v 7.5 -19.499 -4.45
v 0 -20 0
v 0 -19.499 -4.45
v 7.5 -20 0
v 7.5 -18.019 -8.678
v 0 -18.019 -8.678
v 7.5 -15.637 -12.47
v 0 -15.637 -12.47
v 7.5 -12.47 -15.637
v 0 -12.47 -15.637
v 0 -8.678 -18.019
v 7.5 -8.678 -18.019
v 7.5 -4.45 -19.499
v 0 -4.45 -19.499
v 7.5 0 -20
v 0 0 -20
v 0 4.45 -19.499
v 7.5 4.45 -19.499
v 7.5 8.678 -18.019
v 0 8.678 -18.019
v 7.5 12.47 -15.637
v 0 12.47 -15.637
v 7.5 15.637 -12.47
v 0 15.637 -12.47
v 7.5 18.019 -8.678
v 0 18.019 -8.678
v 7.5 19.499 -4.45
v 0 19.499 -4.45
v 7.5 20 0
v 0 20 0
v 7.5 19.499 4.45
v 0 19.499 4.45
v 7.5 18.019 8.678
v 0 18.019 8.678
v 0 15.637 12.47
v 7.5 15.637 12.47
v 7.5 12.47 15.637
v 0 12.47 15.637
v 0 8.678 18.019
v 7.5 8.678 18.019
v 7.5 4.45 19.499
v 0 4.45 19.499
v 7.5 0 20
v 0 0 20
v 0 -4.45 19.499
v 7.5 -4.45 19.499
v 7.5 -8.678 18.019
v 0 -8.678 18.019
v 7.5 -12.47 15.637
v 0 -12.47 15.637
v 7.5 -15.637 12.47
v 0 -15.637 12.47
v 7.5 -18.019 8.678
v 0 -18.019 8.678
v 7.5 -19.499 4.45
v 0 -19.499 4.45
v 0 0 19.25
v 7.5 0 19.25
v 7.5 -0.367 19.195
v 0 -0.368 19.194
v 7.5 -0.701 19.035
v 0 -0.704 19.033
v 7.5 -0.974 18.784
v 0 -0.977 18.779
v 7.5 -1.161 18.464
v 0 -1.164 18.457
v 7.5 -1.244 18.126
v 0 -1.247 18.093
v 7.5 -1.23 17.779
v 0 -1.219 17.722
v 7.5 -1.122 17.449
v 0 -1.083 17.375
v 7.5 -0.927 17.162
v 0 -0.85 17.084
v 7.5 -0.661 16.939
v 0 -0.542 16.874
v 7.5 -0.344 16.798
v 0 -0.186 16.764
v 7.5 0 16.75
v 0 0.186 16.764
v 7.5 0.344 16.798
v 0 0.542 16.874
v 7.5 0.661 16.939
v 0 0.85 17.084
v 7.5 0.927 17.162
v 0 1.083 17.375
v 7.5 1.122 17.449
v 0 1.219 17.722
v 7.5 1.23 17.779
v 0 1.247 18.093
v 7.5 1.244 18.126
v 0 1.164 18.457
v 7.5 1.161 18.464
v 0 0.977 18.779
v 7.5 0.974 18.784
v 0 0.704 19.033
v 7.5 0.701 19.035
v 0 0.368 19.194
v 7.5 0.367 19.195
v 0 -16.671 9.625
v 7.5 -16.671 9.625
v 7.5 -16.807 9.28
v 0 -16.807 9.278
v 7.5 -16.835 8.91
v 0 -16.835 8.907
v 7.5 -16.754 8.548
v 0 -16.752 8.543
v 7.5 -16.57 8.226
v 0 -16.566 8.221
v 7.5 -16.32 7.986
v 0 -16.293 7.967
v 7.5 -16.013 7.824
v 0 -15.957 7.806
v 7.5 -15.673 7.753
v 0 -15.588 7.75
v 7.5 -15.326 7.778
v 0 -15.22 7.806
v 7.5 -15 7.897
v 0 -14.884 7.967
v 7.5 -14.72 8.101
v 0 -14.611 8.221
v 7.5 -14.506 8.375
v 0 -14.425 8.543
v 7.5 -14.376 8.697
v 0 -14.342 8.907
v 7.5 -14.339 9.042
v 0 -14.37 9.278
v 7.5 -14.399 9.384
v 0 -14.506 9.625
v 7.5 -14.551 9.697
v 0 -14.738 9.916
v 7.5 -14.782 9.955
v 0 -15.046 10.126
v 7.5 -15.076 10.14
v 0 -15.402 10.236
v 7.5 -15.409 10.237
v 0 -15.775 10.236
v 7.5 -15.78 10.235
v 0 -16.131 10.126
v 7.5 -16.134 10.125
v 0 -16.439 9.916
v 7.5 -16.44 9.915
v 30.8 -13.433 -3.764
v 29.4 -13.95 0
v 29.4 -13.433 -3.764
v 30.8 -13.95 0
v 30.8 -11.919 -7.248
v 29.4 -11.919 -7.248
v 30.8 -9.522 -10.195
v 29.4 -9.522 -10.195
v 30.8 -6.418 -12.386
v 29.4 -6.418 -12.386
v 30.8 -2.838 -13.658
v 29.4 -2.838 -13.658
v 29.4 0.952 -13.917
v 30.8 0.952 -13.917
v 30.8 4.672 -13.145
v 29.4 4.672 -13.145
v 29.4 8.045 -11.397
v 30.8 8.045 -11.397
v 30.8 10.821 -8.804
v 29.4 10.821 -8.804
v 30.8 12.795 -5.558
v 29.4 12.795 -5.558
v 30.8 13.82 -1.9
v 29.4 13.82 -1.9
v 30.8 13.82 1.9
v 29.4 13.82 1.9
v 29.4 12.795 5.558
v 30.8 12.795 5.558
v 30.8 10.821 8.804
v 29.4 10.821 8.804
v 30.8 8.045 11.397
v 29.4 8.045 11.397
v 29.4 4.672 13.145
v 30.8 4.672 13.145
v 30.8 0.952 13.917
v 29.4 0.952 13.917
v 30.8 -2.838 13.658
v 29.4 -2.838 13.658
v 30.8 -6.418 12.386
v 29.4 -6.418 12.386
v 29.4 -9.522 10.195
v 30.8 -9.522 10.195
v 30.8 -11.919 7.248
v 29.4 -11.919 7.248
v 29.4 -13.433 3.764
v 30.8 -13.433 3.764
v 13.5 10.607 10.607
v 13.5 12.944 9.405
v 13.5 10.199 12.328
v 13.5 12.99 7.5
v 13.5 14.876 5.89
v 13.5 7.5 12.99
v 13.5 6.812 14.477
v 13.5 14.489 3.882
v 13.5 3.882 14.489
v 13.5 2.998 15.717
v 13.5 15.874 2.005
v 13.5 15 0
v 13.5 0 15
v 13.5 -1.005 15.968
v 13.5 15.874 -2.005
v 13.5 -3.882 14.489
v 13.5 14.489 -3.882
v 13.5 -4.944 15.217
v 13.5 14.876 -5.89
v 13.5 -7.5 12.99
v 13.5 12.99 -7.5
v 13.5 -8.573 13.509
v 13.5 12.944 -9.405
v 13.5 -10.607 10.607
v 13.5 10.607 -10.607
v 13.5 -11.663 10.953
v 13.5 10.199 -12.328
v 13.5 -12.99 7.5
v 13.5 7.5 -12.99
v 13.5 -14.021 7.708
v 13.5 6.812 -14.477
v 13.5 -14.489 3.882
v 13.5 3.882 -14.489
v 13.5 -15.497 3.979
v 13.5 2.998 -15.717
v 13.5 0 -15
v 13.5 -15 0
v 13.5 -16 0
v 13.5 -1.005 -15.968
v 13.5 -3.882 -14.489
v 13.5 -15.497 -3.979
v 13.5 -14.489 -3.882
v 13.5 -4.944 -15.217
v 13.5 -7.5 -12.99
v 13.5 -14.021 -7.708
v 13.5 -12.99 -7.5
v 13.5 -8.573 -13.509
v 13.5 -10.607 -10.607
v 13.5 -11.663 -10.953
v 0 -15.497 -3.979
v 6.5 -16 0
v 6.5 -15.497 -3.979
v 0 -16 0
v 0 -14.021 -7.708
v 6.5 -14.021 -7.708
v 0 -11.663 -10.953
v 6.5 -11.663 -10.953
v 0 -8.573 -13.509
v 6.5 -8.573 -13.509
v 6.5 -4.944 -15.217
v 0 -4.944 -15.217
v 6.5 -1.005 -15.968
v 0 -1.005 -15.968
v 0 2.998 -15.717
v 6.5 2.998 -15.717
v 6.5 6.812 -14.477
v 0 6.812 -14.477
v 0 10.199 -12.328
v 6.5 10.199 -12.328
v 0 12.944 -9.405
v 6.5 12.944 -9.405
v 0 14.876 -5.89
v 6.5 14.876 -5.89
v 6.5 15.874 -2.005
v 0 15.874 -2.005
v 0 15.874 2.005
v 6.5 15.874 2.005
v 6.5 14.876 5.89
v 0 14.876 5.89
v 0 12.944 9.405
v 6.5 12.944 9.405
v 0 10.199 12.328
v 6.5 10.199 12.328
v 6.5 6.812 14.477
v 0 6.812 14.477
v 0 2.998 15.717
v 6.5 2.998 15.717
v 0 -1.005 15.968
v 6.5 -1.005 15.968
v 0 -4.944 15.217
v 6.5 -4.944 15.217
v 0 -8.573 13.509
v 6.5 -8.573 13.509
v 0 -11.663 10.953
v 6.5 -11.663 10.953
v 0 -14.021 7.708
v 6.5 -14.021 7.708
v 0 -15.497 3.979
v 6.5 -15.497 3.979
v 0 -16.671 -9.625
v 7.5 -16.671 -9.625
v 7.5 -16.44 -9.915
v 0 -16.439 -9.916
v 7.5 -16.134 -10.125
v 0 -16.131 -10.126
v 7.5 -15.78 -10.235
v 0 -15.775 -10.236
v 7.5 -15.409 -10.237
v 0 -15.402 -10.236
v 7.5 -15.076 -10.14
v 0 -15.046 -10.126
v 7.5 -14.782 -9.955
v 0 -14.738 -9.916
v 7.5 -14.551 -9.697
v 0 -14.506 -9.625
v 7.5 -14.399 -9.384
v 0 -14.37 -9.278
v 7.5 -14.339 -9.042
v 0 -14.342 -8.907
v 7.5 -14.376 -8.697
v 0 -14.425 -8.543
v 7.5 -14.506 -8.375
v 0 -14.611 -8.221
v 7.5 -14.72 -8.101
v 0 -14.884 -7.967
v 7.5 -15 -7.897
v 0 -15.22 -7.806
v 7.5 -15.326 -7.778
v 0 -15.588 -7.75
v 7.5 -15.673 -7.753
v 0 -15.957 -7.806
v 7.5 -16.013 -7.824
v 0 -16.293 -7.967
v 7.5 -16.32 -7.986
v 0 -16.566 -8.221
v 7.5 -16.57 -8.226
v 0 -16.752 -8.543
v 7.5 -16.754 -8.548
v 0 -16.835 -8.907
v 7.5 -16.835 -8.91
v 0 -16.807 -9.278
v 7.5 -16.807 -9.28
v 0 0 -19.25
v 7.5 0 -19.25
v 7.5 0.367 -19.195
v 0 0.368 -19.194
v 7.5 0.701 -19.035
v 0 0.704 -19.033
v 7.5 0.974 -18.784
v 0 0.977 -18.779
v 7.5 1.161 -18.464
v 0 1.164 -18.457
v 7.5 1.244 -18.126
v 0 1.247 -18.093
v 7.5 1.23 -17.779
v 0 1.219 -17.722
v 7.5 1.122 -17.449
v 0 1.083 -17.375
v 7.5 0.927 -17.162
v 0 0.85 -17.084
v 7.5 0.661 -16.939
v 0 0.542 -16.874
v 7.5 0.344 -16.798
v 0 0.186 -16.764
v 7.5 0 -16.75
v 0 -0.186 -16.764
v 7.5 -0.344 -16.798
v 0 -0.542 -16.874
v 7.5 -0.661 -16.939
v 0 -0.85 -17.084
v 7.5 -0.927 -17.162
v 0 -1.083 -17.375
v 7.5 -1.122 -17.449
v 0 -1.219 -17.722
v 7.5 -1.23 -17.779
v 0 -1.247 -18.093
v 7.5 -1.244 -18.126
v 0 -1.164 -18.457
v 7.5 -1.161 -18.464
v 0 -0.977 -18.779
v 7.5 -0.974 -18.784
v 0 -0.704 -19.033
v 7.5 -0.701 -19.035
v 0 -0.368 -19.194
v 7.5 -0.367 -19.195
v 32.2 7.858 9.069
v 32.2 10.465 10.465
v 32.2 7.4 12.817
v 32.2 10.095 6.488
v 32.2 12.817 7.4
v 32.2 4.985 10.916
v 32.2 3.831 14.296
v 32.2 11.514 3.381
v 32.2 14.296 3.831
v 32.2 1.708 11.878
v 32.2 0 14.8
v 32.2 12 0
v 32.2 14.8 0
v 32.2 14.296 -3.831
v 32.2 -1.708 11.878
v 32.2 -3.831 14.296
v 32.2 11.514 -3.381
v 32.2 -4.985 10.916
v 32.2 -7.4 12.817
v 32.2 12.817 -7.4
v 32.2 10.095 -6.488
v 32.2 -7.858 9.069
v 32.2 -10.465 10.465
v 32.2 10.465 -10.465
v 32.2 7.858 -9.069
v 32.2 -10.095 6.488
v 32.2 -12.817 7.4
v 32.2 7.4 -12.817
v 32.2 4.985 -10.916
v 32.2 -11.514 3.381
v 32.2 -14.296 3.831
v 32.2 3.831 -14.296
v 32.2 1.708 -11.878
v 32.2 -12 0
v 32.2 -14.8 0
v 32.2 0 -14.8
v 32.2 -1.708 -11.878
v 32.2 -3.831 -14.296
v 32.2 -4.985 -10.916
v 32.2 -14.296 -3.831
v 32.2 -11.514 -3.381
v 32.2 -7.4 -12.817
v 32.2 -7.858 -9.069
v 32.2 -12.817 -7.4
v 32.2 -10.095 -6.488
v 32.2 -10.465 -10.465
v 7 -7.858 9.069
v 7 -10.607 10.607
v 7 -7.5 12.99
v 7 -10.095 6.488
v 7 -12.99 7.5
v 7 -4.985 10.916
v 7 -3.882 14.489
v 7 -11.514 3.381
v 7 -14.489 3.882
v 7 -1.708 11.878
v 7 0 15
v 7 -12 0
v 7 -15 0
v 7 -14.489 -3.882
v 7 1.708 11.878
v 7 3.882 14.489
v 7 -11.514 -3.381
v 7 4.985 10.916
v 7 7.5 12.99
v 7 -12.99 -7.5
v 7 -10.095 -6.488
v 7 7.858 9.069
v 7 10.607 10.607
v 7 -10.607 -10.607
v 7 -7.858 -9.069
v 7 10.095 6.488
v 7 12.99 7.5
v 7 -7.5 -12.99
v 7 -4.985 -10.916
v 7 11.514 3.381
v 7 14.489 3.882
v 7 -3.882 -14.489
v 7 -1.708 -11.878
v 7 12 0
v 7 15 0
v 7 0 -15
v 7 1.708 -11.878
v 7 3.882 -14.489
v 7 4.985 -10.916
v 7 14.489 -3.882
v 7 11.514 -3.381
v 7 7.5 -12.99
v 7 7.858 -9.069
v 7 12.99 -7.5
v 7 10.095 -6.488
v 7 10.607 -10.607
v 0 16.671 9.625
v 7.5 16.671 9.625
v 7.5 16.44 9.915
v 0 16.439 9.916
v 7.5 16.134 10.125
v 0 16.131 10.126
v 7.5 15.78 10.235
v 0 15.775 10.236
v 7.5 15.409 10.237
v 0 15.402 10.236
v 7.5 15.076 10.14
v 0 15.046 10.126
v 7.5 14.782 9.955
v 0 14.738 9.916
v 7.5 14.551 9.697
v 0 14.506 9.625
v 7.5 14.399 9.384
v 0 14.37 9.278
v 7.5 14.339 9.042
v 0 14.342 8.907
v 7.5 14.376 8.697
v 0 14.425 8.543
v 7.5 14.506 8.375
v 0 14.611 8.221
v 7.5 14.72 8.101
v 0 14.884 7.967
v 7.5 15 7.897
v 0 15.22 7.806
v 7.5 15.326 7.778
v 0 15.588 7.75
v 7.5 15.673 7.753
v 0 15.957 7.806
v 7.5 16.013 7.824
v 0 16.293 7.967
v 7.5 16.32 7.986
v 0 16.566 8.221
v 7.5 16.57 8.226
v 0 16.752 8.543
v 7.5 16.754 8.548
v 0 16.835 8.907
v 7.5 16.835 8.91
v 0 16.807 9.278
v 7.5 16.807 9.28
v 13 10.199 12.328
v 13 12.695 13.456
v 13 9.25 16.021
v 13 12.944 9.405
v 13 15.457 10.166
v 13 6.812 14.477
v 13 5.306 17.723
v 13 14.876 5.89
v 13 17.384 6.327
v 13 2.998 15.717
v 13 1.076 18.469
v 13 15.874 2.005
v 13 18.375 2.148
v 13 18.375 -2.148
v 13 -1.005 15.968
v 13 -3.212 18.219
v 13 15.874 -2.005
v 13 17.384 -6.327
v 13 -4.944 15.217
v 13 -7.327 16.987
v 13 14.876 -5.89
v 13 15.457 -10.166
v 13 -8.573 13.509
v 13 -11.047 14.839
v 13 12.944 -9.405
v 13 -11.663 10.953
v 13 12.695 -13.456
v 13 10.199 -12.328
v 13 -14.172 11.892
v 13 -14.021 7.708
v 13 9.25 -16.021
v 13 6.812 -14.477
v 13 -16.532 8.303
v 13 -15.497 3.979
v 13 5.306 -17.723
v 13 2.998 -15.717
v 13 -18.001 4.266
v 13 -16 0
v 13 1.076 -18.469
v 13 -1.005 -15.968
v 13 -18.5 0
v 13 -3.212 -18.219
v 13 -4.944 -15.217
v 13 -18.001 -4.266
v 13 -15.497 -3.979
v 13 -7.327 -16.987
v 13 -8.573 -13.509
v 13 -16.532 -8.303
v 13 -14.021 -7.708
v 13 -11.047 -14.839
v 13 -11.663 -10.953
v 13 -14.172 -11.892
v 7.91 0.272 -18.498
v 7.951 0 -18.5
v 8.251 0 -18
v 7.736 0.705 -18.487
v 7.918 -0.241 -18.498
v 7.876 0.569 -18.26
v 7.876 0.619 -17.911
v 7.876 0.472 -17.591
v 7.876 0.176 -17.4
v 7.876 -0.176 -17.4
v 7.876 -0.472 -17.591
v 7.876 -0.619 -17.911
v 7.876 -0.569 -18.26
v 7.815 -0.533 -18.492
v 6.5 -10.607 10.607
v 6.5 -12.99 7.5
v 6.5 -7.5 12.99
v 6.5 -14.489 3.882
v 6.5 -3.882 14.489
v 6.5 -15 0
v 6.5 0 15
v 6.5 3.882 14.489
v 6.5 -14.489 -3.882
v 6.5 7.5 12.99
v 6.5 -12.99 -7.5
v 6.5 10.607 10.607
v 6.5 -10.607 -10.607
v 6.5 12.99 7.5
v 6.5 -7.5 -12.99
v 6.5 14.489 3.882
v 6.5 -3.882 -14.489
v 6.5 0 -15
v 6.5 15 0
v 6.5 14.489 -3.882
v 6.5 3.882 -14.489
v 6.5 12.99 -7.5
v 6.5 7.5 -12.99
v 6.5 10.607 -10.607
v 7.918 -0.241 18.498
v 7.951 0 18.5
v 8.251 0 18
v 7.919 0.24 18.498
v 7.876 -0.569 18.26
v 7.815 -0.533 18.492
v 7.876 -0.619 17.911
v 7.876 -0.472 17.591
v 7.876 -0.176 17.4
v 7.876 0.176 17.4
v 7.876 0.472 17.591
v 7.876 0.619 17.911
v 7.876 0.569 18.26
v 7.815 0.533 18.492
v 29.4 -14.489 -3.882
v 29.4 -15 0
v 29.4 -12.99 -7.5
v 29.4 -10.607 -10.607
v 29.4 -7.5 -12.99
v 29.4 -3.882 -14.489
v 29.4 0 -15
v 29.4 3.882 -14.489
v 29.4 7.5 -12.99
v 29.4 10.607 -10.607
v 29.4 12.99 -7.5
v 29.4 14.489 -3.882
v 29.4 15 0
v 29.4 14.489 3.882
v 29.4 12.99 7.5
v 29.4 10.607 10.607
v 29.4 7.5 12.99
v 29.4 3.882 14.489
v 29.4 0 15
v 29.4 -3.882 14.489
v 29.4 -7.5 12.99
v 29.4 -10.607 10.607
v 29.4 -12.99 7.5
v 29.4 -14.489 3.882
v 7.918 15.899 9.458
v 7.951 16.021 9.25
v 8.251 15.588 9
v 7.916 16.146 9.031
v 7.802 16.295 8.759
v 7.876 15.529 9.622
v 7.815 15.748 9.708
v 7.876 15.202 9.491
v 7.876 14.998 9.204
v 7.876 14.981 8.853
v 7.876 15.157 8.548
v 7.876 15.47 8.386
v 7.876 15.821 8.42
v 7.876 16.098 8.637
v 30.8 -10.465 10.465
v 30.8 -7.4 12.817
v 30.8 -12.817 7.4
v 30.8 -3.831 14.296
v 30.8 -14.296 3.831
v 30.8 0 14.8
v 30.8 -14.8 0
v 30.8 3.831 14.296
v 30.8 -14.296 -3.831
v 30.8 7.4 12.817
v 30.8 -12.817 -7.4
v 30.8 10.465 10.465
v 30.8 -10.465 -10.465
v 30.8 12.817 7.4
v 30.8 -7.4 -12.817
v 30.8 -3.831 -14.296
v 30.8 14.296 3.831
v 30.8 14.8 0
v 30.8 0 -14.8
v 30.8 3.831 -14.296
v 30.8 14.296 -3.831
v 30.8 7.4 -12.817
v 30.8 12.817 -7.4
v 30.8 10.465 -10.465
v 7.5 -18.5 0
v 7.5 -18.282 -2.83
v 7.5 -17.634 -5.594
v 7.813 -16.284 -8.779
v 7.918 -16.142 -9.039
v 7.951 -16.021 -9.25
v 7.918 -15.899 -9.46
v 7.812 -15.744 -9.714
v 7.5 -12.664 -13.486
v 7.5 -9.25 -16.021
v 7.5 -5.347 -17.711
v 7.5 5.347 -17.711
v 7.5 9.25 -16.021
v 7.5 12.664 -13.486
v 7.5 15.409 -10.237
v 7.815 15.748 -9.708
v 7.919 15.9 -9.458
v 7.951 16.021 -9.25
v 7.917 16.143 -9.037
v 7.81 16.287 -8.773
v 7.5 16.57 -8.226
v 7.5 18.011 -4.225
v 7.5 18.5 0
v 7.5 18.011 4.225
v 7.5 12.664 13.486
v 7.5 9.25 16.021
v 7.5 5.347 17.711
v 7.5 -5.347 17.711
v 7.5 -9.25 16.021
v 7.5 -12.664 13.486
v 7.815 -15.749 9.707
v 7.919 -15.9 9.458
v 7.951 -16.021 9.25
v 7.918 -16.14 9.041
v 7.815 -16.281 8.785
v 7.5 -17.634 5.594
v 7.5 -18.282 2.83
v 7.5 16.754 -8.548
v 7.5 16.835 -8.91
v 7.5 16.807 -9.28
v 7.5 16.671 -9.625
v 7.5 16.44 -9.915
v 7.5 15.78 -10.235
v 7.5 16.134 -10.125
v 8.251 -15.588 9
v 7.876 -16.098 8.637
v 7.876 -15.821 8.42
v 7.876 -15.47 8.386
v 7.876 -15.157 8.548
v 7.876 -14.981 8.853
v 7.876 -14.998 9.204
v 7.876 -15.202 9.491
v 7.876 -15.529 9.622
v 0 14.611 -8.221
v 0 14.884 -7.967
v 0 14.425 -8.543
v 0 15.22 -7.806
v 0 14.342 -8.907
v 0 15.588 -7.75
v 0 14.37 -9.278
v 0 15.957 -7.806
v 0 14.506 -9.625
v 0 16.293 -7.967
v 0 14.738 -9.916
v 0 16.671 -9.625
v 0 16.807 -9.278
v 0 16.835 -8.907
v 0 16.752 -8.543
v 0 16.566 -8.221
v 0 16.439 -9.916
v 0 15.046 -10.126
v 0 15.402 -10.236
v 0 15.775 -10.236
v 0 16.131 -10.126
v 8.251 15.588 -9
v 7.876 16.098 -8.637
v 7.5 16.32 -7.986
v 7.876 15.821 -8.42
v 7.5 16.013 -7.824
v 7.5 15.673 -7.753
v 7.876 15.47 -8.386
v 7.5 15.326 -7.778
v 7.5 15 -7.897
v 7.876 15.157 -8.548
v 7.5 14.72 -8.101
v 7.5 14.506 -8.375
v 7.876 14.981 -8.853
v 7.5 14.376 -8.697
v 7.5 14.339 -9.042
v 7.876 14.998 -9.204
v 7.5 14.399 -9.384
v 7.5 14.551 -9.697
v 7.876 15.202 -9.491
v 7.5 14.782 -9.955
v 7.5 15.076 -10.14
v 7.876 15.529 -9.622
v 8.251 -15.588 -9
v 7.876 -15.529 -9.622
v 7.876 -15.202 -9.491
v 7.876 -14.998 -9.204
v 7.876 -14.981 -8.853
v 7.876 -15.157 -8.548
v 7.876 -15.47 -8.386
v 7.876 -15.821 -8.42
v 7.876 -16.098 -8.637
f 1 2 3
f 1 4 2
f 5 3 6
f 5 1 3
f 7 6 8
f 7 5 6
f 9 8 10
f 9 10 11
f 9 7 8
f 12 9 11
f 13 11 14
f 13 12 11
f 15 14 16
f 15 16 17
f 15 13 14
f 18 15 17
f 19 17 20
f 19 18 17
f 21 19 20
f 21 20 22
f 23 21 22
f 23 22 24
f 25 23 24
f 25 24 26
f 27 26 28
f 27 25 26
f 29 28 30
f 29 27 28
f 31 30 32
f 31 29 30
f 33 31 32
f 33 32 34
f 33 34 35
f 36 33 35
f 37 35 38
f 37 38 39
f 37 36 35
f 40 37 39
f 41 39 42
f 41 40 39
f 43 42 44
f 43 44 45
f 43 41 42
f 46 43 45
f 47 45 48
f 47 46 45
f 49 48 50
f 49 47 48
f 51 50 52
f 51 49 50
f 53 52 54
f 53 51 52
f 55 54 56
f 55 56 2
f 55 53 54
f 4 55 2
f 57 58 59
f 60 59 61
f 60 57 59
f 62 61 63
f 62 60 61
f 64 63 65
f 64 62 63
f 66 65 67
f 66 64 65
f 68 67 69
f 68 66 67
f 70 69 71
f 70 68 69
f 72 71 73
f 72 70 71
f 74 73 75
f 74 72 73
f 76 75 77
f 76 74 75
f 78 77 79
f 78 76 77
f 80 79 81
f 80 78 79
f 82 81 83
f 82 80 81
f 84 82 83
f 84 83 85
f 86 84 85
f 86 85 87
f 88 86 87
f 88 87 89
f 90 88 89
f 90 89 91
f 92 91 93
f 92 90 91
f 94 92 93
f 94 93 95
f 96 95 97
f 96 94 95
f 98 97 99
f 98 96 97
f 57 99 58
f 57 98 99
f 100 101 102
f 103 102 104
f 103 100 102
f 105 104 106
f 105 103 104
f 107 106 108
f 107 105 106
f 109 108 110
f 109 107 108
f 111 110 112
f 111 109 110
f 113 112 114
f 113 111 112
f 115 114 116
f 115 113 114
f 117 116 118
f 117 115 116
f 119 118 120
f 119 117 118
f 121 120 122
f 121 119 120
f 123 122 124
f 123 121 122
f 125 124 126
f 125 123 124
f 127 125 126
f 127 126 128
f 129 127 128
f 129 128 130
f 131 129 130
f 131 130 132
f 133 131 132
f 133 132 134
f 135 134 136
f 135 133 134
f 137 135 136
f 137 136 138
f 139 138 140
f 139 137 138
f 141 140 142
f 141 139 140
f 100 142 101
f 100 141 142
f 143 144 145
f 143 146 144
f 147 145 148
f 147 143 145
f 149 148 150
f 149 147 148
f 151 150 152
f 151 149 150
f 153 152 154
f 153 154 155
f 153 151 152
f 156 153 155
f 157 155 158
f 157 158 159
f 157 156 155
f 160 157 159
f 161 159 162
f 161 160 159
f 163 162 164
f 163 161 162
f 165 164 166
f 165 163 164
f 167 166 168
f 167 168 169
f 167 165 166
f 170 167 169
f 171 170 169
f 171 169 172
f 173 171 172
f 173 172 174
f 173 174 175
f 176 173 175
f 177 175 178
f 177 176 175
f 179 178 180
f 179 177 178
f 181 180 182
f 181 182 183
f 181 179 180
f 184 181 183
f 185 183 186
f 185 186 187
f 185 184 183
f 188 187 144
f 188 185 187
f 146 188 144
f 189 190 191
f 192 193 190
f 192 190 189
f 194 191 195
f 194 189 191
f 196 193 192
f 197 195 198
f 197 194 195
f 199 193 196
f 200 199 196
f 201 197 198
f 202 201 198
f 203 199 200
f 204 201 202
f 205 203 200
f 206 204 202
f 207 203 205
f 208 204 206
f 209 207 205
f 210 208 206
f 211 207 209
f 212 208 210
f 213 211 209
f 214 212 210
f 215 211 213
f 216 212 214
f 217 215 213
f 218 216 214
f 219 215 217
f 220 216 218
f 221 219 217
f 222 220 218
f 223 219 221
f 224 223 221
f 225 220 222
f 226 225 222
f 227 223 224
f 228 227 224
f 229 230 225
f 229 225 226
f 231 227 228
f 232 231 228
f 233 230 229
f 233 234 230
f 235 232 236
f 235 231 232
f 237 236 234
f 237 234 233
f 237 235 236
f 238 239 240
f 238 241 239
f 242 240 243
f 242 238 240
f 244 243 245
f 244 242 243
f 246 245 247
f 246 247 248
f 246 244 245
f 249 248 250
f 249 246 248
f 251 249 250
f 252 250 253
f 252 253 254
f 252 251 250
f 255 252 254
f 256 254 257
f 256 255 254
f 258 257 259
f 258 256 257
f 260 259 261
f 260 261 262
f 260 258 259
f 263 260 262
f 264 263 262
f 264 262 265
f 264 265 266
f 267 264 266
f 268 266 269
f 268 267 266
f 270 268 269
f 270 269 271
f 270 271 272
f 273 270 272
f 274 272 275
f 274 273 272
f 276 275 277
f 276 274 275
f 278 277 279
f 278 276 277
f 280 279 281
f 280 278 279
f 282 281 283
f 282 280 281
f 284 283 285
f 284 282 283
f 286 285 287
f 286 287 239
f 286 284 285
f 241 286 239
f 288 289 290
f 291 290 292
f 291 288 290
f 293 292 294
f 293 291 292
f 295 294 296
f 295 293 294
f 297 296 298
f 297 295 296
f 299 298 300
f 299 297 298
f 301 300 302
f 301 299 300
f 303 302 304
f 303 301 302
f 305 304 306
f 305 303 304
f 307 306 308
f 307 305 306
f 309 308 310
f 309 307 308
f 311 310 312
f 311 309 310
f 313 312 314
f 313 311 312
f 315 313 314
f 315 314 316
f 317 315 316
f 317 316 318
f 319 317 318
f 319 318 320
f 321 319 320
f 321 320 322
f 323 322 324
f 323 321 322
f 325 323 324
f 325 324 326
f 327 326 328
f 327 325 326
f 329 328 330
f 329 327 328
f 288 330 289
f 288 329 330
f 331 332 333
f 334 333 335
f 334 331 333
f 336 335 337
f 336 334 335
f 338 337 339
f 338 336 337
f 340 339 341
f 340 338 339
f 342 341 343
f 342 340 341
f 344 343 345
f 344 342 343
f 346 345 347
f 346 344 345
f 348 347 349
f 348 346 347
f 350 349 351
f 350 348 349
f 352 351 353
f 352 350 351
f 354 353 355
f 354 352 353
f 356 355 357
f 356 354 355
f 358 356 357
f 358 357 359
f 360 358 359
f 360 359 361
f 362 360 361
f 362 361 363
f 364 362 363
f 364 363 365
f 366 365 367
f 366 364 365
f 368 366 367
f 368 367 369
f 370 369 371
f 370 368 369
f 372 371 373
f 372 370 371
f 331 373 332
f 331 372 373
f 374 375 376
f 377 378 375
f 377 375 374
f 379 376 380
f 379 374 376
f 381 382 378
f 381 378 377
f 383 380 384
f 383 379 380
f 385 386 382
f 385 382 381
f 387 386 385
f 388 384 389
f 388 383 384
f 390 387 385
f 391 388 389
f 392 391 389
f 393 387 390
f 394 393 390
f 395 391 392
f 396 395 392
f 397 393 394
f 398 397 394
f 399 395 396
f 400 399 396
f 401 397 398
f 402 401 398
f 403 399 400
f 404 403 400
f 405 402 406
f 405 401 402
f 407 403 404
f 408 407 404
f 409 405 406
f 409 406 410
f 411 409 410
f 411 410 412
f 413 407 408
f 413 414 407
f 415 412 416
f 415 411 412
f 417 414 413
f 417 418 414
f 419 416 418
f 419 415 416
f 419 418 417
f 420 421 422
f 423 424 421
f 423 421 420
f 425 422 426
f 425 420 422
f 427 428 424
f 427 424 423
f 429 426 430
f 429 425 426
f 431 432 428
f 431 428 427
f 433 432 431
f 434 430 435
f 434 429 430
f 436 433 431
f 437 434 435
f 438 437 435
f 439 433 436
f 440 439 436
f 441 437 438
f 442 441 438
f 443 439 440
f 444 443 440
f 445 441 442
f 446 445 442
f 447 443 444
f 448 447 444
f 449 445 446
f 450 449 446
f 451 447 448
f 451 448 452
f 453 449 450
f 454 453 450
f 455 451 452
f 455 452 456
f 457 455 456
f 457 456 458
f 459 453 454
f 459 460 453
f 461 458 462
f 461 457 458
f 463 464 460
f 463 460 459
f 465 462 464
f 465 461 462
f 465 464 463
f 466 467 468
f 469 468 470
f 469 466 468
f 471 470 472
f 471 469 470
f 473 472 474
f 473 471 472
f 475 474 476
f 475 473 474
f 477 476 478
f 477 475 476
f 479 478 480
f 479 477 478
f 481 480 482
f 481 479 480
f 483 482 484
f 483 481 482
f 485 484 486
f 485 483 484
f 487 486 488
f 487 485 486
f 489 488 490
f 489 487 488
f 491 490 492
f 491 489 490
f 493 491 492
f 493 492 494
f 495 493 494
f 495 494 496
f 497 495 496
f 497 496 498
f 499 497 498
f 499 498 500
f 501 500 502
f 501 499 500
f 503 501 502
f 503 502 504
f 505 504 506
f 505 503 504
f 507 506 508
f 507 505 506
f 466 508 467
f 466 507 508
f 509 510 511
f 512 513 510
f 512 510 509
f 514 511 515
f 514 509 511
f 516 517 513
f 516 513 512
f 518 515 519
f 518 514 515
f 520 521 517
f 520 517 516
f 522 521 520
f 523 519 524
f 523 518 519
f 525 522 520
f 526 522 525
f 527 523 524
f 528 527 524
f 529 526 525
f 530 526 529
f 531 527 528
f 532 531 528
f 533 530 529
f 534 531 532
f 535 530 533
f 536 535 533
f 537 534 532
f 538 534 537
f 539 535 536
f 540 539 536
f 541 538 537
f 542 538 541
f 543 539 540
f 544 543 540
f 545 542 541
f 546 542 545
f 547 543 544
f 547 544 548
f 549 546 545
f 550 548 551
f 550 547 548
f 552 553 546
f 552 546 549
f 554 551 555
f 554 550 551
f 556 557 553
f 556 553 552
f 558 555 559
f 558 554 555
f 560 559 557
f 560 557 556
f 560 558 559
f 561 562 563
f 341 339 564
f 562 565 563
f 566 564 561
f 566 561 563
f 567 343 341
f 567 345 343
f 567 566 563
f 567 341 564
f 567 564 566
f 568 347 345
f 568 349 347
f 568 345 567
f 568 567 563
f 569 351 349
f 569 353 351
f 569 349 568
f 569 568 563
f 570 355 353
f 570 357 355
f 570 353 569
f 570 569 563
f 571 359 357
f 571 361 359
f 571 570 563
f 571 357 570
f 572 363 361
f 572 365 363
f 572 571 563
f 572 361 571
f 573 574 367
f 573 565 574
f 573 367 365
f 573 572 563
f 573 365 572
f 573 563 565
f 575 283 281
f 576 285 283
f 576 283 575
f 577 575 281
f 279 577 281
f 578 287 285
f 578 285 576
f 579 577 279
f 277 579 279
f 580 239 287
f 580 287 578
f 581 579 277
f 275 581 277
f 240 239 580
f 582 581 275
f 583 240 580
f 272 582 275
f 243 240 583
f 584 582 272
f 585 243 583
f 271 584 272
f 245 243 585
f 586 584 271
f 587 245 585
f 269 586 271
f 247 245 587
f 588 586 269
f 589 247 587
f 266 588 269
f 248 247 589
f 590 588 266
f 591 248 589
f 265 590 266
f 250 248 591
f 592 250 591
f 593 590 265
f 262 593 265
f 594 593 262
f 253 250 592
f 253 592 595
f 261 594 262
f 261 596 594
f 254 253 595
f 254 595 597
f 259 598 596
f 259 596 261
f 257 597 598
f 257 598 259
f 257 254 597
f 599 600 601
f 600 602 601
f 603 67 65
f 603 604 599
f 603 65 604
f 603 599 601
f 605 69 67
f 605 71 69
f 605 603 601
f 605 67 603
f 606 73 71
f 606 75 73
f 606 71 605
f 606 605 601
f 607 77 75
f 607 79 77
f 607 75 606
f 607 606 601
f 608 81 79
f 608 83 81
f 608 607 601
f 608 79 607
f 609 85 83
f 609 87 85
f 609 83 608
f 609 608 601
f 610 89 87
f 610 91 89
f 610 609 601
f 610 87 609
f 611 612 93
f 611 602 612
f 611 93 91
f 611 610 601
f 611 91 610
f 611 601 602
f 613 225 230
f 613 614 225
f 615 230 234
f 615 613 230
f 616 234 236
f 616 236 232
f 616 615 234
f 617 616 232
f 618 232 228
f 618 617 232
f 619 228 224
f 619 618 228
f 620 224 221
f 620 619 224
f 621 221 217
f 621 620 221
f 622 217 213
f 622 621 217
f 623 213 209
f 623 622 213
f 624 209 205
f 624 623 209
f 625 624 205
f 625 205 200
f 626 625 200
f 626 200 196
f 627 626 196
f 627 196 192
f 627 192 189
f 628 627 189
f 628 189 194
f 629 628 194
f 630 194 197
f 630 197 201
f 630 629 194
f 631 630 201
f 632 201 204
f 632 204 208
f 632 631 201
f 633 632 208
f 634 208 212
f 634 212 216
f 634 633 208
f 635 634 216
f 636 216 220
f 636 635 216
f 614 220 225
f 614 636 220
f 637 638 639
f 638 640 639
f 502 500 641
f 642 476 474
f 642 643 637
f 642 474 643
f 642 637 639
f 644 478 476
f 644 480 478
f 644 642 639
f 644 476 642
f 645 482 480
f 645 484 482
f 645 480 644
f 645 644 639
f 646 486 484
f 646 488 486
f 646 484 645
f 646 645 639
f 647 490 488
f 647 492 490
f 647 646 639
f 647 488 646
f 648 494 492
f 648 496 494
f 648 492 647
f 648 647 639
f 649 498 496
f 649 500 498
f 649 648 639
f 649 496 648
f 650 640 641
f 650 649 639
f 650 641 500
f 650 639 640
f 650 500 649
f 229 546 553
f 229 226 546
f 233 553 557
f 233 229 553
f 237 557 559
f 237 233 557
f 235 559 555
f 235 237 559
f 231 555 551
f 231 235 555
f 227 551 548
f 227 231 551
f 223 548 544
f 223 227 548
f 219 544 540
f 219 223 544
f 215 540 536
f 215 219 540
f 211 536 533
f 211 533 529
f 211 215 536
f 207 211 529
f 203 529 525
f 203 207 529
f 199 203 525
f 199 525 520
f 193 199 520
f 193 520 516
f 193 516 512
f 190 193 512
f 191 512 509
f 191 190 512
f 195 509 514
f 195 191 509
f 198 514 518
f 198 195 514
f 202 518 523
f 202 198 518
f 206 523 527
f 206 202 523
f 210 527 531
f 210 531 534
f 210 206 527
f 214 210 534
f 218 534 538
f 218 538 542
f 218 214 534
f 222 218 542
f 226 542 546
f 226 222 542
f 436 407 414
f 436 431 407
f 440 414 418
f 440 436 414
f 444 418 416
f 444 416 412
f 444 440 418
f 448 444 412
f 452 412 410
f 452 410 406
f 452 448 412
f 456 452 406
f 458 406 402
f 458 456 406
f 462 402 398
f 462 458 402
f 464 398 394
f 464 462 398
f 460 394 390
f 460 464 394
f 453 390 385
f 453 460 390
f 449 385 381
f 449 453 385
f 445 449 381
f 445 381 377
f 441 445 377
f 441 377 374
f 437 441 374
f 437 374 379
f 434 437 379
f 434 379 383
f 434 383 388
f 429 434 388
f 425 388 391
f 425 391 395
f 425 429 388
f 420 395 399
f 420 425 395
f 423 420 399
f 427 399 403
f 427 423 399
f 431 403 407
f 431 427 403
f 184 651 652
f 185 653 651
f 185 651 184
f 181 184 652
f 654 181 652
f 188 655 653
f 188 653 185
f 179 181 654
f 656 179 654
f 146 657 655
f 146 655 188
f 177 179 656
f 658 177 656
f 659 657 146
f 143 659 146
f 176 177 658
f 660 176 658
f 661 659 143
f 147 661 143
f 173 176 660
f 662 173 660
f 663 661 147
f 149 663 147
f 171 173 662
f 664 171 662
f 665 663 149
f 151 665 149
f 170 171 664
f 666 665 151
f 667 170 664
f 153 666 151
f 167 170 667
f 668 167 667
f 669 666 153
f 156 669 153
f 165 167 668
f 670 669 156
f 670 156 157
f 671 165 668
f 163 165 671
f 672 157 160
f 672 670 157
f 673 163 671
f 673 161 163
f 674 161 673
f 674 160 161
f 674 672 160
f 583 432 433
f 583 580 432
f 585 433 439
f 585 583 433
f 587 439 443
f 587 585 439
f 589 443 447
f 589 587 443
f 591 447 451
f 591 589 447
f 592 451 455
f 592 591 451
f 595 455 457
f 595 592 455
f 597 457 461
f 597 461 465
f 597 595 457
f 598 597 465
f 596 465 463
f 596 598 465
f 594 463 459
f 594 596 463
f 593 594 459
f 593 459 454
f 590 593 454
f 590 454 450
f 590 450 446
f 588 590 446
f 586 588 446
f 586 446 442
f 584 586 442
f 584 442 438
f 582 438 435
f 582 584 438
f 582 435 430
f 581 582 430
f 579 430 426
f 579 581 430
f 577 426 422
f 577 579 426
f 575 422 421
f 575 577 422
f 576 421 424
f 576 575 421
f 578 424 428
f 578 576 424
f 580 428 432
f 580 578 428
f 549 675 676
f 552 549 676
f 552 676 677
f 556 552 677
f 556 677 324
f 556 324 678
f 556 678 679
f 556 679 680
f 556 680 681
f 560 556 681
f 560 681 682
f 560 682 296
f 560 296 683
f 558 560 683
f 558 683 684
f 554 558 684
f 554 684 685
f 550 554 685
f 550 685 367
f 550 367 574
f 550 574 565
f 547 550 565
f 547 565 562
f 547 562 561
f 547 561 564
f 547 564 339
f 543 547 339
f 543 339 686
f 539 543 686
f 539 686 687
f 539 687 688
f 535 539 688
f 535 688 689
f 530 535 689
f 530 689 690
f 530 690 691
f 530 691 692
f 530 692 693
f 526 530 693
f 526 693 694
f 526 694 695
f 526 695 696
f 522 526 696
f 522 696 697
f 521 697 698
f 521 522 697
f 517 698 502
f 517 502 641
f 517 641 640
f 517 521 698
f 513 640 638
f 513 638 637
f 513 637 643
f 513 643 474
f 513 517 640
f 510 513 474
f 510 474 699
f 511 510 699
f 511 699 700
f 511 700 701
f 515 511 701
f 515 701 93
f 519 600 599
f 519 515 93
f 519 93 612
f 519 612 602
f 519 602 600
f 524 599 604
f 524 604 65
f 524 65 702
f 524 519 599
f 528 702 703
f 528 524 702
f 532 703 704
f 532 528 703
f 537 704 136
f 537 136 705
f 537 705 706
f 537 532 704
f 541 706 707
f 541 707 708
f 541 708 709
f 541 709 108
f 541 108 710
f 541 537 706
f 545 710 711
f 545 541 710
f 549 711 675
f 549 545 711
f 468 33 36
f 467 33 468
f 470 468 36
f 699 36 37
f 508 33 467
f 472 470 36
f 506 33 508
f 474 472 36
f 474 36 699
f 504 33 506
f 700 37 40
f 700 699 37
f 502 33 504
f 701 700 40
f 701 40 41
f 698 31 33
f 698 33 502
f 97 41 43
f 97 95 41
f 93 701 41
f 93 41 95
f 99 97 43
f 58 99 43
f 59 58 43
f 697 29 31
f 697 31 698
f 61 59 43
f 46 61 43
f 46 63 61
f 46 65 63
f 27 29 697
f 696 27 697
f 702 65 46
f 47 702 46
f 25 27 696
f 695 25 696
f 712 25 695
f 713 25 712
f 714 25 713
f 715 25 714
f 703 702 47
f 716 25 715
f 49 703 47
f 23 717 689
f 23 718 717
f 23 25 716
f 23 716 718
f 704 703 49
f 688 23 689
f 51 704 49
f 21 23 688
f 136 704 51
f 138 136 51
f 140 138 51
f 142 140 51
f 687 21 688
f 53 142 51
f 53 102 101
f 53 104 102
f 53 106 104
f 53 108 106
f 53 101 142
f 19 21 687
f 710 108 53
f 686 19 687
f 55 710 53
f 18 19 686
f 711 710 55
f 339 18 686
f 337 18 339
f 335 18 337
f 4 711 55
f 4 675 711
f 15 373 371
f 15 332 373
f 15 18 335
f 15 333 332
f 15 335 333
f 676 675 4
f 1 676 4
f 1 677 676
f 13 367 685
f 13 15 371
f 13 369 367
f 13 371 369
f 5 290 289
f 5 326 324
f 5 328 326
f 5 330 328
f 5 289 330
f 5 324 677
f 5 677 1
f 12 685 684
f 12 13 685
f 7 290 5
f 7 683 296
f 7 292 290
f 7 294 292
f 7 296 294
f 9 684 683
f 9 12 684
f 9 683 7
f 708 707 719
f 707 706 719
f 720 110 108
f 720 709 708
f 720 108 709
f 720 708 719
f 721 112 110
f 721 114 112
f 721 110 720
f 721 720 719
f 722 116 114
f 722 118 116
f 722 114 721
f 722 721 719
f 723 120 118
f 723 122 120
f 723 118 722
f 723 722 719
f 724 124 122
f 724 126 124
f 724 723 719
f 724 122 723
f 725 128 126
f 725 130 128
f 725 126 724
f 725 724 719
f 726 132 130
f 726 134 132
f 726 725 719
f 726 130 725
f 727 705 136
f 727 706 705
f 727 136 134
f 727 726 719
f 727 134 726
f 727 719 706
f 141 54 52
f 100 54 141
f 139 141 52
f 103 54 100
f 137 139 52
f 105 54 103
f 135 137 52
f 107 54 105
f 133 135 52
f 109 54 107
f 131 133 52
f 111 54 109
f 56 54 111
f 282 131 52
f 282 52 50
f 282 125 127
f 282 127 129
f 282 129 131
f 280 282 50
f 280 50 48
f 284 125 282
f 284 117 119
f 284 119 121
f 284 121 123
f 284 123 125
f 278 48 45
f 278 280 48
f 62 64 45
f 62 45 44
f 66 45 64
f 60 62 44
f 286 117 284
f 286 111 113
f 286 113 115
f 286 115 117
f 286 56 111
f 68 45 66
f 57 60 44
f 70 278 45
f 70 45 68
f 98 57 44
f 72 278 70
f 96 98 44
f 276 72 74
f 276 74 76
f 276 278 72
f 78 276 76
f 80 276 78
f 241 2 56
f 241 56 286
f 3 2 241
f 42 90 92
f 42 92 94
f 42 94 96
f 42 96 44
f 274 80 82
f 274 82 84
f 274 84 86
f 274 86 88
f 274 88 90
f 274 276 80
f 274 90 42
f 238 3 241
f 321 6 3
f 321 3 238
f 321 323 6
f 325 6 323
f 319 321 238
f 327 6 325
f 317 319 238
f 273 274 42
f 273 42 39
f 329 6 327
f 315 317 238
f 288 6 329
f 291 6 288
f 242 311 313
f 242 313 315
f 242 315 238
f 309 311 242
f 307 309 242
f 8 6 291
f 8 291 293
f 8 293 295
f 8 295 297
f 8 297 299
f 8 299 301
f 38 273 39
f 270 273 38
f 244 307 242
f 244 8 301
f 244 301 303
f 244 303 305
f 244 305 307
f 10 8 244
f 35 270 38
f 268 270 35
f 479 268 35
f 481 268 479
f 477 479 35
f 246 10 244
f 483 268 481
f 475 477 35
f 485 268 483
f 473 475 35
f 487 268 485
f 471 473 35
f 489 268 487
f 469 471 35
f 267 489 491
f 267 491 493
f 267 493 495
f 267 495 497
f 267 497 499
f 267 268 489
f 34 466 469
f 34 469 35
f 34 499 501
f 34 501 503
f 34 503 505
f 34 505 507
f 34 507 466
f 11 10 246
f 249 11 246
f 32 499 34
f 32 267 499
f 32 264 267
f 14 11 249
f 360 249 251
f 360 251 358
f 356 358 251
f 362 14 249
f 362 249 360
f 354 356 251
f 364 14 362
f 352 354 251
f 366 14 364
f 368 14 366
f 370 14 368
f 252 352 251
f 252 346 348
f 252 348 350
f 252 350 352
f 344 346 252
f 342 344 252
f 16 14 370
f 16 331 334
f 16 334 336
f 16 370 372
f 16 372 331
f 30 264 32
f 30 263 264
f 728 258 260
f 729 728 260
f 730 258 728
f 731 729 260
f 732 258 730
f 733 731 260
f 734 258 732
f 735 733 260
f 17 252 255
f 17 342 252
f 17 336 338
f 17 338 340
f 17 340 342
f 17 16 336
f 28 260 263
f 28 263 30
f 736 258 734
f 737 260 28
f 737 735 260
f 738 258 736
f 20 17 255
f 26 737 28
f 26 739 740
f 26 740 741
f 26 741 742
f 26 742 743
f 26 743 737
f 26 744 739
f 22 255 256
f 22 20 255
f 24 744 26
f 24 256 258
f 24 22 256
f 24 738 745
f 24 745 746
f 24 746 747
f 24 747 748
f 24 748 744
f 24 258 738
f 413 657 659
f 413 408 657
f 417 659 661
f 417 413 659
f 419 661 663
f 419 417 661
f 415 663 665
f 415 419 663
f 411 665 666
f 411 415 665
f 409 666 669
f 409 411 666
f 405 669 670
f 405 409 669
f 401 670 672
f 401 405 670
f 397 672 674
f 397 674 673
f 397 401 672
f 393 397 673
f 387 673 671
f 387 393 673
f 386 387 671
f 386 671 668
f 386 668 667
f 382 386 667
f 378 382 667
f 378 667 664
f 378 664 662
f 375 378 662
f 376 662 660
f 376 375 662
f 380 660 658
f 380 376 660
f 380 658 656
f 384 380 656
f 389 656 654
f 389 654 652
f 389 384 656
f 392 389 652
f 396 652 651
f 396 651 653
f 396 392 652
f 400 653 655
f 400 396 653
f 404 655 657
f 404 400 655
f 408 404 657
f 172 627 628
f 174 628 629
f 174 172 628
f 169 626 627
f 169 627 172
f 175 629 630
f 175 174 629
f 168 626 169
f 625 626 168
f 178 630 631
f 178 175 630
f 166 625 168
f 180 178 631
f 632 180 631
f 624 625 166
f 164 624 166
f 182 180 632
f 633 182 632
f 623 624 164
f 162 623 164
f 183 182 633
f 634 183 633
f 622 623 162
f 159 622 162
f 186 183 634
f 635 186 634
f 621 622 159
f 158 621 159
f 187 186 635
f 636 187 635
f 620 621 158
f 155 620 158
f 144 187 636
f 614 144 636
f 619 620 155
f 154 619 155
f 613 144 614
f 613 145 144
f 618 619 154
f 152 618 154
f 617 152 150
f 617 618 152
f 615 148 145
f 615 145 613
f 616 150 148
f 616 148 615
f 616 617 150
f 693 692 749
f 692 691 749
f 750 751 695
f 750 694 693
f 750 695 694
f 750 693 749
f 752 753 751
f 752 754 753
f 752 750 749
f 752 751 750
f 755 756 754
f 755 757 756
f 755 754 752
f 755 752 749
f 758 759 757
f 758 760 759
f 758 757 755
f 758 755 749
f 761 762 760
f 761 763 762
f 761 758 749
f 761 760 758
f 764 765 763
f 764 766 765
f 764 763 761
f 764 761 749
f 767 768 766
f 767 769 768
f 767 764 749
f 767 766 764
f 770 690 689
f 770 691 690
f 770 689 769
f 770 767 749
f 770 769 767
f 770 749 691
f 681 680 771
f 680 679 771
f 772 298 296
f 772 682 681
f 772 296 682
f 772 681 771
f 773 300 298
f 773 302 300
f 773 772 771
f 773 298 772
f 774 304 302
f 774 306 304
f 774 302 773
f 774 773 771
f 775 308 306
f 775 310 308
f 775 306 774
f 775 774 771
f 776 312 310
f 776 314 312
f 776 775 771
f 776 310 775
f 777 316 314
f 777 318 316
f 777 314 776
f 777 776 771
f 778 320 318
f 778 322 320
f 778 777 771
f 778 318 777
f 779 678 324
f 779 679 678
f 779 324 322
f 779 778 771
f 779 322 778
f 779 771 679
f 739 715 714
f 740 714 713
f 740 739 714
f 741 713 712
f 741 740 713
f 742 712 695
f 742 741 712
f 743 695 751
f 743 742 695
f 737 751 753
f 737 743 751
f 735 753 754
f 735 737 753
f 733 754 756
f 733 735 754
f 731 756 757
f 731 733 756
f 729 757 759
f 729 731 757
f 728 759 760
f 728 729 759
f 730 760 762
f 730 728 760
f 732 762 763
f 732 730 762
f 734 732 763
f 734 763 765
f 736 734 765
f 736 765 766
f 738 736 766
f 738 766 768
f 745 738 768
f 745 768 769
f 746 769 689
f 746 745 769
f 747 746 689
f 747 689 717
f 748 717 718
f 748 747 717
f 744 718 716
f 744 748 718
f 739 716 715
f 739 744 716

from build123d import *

# Parameters (mm, degrees)
CIRPATTERN1_COUNT = 6


with BuildPart() as part:
    # Sketch1 → Revolve1 (revolve)
    with BuildSketch(Plane.XY, mode=Mode.PRIVATE) as revolve1_sk:
        Polygon((0, 16), (0, 20), (7.5, 20), (7.5, 18.5), (13, 18.5), (13, 16), (13.5, 16), (13.5, 15), (29.4, 15), (29.4, 13.95), (30.8, 13.95), (30.8, 14.8), (32.2, 14.8), (32.2, 12), (7, 12), (7, 15), (6.5, 15), (6.5, 16), align=None)
    revolve(revolve1_sk.sketch.rotate(Axis((-3.70841034, 0, 0), (1, 0, 0)), 180), axis=Axis((-3.70841034, 0, 0), (1, 0, 0)))

    # Sketch4 → M3 Tapped Hole1 (revolve, cut)
    with BuildSketch(Plane(origin=(0, 0, 18), x_dir=(0, 0, 1), z_dir=(0, 1, 0))):
        Polygon((0, 0), (0, 8.251075774), (1.25, 7.5), (1.25, 0), align=None)
    m3_tapped_hole1 = revolve(axis=Axis((-6.35, 0, 18), (1, 0, 0)), mode=Mode.SUBTRACT)

    # CirPattern1: M3 Tapped Hole1 ×6 about axis
    cirpattern1_axis = Axis((0, 0, 0), (1, 0, 0))
    for i in range(1, CIRPATTERN1_COUNT):
        add(m3_tapped_hole1.rotate(cirpattern1_axis, i * 360 / CIRPATTERN1_COUNT), mode=Mode.SUBTRACT)


solid = part.part
